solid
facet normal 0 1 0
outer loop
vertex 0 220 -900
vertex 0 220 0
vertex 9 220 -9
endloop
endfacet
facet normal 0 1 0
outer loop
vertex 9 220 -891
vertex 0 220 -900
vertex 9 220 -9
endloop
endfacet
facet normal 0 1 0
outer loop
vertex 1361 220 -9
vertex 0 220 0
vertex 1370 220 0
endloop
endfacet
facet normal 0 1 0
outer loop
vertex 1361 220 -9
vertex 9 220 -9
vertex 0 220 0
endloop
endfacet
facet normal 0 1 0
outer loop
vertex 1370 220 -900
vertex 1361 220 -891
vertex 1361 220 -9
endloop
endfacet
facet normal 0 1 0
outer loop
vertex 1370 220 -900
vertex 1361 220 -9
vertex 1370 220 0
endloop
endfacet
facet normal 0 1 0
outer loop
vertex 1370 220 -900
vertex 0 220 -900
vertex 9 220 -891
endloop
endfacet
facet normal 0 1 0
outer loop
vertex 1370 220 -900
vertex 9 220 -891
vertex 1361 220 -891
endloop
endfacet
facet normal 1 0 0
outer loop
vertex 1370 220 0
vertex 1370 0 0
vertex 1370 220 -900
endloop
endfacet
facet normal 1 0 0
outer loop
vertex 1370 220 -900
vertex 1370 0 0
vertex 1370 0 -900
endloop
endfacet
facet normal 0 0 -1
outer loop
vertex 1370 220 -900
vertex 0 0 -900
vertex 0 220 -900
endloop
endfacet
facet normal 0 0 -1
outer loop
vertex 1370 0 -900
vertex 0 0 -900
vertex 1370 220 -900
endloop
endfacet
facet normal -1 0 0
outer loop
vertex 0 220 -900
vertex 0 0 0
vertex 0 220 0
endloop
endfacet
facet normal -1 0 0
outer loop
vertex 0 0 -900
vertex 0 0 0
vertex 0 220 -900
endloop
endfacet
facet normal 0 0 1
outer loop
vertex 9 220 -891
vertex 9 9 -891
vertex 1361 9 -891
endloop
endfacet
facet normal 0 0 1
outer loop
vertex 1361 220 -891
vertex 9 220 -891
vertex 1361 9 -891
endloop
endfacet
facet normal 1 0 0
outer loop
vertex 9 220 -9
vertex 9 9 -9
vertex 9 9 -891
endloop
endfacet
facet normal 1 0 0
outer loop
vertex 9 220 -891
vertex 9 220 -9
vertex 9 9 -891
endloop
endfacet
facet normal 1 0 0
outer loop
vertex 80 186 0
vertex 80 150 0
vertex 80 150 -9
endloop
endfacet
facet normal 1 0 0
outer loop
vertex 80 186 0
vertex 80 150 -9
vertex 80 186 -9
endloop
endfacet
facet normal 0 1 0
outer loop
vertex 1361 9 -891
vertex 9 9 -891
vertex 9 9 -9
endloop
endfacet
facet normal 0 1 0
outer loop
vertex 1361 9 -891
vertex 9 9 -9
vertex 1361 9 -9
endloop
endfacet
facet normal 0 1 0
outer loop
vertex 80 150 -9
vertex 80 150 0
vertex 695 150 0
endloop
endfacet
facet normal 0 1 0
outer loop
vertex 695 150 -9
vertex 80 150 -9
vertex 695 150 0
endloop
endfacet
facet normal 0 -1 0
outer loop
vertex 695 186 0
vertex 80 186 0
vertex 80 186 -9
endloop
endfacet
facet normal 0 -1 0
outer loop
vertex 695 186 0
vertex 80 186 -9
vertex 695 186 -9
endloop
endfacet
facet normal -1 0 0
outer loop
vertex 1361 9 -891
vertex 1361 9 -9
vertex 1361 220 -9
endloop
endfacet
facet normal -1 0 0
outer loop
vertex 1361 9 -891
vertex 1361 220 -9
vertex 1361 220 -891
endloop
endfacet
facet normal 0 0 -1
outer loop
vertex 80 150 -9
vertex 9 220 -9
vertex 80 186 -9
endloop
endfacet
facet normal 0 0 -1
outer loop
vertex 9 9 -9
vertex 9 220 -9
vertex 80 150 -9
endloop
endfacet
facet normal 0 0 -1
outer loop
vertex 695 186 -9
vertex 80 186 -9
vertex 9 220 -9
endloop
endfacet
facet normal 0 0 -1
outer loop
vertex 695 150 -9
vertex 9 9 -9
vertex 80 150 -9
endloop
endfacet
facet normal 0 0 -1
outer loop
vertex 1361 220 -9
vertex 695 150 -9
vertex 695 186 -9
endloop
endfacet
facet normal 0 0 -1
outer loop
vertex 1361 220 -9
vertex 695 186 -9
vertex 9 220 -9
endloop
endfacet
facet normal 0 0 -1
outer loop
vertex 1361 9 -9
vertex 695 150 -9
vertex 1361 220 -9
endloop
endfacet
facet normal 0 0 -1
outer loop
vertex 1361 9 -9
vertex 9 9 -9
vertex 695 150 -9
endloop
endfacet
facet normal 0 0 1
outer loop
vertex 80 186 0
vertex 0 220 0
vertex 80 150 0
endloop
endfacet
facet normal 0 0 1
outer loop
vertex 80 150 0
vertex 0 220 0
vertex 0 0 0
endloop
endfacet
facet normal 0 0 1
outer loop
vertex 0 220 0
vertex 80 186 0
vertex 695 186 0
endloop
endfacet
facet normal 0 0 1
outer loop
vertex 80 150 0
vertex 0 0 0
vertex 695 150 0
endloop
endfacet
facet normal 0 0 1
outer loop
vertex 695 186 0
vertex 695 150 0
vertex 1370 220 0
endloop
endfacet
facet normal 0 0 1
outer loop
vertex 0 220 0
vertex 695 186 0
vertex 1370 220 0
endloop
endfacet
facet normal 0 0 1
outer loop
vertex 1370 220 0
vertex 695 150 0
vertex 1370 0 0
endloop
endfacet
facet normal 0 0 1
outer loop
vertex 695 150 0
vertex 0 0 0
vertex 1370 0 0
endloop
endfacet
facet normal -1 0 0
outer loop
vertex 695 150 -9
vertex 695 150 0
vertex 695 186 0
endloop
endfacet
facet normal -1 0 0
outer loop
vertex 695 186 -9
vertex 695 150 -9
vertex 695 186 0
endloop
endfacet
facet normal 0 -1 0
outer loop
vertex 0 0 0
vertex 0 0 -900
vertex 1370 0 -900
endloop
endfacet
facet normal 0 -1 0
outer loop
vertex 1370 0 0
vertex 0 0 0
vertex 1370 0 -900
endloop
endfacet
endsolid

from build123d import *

# Parameters (mm, degrees)
SKETCH1_W           = 1370
SKETCH1_H           = 900
BOSS_EXTRUDE1_DEPTH = 220
SHELL1_T            = -9
CUT_EXTRUDE1_REACH  = 1655.874
SKETCH3_W           = 615
SKETCH3_H           = 36


with BuildPart() as part:
    # Sketch1 → Boss-Extrude1 (new body)
    with BuildSketch(Plane(origin=(0, 0, 0), x_dir=(1, 0, 0), z_dir=(0, 1, 0))):
        with Locations((685, 450)):
            Rectangle(SKETCH1_W, SKETCH1_H)
    extrude(amount=BOSS_EXTRUDE1_DEPTH)

    # Shell1
    shell1_openings = [part.faces().sort_by_distance(p)[0] for p in [
        (685, 220, -450),
    ]]
    offset(amount=SHELL1_T, openings=shell1_openings, kind=Kind.INTERSECTION)

    # Sketch3 → Cut-Extrude1 (cut, up to next)
    with BuildSketch(Plane.XY, mode=Mode.PRIVATE) as cut_extrude1_sk1:
        with Locations((387.5, 168)):
            Rectangle(SKETCH3_W, SKETCH3_H)
    cut_extrude1_tool1 = extrude(cut_extrude1_sk1.sketch, amount=-CUT_EXTRUDE1_REACH, mode=Mode.PRIVATE) & part.part
    add(cut_extrude1_tool1.solids().sort_by_distance((387.5, 168, 0))[0], mode=Mode.SUBTRACT)


solid = part.part
